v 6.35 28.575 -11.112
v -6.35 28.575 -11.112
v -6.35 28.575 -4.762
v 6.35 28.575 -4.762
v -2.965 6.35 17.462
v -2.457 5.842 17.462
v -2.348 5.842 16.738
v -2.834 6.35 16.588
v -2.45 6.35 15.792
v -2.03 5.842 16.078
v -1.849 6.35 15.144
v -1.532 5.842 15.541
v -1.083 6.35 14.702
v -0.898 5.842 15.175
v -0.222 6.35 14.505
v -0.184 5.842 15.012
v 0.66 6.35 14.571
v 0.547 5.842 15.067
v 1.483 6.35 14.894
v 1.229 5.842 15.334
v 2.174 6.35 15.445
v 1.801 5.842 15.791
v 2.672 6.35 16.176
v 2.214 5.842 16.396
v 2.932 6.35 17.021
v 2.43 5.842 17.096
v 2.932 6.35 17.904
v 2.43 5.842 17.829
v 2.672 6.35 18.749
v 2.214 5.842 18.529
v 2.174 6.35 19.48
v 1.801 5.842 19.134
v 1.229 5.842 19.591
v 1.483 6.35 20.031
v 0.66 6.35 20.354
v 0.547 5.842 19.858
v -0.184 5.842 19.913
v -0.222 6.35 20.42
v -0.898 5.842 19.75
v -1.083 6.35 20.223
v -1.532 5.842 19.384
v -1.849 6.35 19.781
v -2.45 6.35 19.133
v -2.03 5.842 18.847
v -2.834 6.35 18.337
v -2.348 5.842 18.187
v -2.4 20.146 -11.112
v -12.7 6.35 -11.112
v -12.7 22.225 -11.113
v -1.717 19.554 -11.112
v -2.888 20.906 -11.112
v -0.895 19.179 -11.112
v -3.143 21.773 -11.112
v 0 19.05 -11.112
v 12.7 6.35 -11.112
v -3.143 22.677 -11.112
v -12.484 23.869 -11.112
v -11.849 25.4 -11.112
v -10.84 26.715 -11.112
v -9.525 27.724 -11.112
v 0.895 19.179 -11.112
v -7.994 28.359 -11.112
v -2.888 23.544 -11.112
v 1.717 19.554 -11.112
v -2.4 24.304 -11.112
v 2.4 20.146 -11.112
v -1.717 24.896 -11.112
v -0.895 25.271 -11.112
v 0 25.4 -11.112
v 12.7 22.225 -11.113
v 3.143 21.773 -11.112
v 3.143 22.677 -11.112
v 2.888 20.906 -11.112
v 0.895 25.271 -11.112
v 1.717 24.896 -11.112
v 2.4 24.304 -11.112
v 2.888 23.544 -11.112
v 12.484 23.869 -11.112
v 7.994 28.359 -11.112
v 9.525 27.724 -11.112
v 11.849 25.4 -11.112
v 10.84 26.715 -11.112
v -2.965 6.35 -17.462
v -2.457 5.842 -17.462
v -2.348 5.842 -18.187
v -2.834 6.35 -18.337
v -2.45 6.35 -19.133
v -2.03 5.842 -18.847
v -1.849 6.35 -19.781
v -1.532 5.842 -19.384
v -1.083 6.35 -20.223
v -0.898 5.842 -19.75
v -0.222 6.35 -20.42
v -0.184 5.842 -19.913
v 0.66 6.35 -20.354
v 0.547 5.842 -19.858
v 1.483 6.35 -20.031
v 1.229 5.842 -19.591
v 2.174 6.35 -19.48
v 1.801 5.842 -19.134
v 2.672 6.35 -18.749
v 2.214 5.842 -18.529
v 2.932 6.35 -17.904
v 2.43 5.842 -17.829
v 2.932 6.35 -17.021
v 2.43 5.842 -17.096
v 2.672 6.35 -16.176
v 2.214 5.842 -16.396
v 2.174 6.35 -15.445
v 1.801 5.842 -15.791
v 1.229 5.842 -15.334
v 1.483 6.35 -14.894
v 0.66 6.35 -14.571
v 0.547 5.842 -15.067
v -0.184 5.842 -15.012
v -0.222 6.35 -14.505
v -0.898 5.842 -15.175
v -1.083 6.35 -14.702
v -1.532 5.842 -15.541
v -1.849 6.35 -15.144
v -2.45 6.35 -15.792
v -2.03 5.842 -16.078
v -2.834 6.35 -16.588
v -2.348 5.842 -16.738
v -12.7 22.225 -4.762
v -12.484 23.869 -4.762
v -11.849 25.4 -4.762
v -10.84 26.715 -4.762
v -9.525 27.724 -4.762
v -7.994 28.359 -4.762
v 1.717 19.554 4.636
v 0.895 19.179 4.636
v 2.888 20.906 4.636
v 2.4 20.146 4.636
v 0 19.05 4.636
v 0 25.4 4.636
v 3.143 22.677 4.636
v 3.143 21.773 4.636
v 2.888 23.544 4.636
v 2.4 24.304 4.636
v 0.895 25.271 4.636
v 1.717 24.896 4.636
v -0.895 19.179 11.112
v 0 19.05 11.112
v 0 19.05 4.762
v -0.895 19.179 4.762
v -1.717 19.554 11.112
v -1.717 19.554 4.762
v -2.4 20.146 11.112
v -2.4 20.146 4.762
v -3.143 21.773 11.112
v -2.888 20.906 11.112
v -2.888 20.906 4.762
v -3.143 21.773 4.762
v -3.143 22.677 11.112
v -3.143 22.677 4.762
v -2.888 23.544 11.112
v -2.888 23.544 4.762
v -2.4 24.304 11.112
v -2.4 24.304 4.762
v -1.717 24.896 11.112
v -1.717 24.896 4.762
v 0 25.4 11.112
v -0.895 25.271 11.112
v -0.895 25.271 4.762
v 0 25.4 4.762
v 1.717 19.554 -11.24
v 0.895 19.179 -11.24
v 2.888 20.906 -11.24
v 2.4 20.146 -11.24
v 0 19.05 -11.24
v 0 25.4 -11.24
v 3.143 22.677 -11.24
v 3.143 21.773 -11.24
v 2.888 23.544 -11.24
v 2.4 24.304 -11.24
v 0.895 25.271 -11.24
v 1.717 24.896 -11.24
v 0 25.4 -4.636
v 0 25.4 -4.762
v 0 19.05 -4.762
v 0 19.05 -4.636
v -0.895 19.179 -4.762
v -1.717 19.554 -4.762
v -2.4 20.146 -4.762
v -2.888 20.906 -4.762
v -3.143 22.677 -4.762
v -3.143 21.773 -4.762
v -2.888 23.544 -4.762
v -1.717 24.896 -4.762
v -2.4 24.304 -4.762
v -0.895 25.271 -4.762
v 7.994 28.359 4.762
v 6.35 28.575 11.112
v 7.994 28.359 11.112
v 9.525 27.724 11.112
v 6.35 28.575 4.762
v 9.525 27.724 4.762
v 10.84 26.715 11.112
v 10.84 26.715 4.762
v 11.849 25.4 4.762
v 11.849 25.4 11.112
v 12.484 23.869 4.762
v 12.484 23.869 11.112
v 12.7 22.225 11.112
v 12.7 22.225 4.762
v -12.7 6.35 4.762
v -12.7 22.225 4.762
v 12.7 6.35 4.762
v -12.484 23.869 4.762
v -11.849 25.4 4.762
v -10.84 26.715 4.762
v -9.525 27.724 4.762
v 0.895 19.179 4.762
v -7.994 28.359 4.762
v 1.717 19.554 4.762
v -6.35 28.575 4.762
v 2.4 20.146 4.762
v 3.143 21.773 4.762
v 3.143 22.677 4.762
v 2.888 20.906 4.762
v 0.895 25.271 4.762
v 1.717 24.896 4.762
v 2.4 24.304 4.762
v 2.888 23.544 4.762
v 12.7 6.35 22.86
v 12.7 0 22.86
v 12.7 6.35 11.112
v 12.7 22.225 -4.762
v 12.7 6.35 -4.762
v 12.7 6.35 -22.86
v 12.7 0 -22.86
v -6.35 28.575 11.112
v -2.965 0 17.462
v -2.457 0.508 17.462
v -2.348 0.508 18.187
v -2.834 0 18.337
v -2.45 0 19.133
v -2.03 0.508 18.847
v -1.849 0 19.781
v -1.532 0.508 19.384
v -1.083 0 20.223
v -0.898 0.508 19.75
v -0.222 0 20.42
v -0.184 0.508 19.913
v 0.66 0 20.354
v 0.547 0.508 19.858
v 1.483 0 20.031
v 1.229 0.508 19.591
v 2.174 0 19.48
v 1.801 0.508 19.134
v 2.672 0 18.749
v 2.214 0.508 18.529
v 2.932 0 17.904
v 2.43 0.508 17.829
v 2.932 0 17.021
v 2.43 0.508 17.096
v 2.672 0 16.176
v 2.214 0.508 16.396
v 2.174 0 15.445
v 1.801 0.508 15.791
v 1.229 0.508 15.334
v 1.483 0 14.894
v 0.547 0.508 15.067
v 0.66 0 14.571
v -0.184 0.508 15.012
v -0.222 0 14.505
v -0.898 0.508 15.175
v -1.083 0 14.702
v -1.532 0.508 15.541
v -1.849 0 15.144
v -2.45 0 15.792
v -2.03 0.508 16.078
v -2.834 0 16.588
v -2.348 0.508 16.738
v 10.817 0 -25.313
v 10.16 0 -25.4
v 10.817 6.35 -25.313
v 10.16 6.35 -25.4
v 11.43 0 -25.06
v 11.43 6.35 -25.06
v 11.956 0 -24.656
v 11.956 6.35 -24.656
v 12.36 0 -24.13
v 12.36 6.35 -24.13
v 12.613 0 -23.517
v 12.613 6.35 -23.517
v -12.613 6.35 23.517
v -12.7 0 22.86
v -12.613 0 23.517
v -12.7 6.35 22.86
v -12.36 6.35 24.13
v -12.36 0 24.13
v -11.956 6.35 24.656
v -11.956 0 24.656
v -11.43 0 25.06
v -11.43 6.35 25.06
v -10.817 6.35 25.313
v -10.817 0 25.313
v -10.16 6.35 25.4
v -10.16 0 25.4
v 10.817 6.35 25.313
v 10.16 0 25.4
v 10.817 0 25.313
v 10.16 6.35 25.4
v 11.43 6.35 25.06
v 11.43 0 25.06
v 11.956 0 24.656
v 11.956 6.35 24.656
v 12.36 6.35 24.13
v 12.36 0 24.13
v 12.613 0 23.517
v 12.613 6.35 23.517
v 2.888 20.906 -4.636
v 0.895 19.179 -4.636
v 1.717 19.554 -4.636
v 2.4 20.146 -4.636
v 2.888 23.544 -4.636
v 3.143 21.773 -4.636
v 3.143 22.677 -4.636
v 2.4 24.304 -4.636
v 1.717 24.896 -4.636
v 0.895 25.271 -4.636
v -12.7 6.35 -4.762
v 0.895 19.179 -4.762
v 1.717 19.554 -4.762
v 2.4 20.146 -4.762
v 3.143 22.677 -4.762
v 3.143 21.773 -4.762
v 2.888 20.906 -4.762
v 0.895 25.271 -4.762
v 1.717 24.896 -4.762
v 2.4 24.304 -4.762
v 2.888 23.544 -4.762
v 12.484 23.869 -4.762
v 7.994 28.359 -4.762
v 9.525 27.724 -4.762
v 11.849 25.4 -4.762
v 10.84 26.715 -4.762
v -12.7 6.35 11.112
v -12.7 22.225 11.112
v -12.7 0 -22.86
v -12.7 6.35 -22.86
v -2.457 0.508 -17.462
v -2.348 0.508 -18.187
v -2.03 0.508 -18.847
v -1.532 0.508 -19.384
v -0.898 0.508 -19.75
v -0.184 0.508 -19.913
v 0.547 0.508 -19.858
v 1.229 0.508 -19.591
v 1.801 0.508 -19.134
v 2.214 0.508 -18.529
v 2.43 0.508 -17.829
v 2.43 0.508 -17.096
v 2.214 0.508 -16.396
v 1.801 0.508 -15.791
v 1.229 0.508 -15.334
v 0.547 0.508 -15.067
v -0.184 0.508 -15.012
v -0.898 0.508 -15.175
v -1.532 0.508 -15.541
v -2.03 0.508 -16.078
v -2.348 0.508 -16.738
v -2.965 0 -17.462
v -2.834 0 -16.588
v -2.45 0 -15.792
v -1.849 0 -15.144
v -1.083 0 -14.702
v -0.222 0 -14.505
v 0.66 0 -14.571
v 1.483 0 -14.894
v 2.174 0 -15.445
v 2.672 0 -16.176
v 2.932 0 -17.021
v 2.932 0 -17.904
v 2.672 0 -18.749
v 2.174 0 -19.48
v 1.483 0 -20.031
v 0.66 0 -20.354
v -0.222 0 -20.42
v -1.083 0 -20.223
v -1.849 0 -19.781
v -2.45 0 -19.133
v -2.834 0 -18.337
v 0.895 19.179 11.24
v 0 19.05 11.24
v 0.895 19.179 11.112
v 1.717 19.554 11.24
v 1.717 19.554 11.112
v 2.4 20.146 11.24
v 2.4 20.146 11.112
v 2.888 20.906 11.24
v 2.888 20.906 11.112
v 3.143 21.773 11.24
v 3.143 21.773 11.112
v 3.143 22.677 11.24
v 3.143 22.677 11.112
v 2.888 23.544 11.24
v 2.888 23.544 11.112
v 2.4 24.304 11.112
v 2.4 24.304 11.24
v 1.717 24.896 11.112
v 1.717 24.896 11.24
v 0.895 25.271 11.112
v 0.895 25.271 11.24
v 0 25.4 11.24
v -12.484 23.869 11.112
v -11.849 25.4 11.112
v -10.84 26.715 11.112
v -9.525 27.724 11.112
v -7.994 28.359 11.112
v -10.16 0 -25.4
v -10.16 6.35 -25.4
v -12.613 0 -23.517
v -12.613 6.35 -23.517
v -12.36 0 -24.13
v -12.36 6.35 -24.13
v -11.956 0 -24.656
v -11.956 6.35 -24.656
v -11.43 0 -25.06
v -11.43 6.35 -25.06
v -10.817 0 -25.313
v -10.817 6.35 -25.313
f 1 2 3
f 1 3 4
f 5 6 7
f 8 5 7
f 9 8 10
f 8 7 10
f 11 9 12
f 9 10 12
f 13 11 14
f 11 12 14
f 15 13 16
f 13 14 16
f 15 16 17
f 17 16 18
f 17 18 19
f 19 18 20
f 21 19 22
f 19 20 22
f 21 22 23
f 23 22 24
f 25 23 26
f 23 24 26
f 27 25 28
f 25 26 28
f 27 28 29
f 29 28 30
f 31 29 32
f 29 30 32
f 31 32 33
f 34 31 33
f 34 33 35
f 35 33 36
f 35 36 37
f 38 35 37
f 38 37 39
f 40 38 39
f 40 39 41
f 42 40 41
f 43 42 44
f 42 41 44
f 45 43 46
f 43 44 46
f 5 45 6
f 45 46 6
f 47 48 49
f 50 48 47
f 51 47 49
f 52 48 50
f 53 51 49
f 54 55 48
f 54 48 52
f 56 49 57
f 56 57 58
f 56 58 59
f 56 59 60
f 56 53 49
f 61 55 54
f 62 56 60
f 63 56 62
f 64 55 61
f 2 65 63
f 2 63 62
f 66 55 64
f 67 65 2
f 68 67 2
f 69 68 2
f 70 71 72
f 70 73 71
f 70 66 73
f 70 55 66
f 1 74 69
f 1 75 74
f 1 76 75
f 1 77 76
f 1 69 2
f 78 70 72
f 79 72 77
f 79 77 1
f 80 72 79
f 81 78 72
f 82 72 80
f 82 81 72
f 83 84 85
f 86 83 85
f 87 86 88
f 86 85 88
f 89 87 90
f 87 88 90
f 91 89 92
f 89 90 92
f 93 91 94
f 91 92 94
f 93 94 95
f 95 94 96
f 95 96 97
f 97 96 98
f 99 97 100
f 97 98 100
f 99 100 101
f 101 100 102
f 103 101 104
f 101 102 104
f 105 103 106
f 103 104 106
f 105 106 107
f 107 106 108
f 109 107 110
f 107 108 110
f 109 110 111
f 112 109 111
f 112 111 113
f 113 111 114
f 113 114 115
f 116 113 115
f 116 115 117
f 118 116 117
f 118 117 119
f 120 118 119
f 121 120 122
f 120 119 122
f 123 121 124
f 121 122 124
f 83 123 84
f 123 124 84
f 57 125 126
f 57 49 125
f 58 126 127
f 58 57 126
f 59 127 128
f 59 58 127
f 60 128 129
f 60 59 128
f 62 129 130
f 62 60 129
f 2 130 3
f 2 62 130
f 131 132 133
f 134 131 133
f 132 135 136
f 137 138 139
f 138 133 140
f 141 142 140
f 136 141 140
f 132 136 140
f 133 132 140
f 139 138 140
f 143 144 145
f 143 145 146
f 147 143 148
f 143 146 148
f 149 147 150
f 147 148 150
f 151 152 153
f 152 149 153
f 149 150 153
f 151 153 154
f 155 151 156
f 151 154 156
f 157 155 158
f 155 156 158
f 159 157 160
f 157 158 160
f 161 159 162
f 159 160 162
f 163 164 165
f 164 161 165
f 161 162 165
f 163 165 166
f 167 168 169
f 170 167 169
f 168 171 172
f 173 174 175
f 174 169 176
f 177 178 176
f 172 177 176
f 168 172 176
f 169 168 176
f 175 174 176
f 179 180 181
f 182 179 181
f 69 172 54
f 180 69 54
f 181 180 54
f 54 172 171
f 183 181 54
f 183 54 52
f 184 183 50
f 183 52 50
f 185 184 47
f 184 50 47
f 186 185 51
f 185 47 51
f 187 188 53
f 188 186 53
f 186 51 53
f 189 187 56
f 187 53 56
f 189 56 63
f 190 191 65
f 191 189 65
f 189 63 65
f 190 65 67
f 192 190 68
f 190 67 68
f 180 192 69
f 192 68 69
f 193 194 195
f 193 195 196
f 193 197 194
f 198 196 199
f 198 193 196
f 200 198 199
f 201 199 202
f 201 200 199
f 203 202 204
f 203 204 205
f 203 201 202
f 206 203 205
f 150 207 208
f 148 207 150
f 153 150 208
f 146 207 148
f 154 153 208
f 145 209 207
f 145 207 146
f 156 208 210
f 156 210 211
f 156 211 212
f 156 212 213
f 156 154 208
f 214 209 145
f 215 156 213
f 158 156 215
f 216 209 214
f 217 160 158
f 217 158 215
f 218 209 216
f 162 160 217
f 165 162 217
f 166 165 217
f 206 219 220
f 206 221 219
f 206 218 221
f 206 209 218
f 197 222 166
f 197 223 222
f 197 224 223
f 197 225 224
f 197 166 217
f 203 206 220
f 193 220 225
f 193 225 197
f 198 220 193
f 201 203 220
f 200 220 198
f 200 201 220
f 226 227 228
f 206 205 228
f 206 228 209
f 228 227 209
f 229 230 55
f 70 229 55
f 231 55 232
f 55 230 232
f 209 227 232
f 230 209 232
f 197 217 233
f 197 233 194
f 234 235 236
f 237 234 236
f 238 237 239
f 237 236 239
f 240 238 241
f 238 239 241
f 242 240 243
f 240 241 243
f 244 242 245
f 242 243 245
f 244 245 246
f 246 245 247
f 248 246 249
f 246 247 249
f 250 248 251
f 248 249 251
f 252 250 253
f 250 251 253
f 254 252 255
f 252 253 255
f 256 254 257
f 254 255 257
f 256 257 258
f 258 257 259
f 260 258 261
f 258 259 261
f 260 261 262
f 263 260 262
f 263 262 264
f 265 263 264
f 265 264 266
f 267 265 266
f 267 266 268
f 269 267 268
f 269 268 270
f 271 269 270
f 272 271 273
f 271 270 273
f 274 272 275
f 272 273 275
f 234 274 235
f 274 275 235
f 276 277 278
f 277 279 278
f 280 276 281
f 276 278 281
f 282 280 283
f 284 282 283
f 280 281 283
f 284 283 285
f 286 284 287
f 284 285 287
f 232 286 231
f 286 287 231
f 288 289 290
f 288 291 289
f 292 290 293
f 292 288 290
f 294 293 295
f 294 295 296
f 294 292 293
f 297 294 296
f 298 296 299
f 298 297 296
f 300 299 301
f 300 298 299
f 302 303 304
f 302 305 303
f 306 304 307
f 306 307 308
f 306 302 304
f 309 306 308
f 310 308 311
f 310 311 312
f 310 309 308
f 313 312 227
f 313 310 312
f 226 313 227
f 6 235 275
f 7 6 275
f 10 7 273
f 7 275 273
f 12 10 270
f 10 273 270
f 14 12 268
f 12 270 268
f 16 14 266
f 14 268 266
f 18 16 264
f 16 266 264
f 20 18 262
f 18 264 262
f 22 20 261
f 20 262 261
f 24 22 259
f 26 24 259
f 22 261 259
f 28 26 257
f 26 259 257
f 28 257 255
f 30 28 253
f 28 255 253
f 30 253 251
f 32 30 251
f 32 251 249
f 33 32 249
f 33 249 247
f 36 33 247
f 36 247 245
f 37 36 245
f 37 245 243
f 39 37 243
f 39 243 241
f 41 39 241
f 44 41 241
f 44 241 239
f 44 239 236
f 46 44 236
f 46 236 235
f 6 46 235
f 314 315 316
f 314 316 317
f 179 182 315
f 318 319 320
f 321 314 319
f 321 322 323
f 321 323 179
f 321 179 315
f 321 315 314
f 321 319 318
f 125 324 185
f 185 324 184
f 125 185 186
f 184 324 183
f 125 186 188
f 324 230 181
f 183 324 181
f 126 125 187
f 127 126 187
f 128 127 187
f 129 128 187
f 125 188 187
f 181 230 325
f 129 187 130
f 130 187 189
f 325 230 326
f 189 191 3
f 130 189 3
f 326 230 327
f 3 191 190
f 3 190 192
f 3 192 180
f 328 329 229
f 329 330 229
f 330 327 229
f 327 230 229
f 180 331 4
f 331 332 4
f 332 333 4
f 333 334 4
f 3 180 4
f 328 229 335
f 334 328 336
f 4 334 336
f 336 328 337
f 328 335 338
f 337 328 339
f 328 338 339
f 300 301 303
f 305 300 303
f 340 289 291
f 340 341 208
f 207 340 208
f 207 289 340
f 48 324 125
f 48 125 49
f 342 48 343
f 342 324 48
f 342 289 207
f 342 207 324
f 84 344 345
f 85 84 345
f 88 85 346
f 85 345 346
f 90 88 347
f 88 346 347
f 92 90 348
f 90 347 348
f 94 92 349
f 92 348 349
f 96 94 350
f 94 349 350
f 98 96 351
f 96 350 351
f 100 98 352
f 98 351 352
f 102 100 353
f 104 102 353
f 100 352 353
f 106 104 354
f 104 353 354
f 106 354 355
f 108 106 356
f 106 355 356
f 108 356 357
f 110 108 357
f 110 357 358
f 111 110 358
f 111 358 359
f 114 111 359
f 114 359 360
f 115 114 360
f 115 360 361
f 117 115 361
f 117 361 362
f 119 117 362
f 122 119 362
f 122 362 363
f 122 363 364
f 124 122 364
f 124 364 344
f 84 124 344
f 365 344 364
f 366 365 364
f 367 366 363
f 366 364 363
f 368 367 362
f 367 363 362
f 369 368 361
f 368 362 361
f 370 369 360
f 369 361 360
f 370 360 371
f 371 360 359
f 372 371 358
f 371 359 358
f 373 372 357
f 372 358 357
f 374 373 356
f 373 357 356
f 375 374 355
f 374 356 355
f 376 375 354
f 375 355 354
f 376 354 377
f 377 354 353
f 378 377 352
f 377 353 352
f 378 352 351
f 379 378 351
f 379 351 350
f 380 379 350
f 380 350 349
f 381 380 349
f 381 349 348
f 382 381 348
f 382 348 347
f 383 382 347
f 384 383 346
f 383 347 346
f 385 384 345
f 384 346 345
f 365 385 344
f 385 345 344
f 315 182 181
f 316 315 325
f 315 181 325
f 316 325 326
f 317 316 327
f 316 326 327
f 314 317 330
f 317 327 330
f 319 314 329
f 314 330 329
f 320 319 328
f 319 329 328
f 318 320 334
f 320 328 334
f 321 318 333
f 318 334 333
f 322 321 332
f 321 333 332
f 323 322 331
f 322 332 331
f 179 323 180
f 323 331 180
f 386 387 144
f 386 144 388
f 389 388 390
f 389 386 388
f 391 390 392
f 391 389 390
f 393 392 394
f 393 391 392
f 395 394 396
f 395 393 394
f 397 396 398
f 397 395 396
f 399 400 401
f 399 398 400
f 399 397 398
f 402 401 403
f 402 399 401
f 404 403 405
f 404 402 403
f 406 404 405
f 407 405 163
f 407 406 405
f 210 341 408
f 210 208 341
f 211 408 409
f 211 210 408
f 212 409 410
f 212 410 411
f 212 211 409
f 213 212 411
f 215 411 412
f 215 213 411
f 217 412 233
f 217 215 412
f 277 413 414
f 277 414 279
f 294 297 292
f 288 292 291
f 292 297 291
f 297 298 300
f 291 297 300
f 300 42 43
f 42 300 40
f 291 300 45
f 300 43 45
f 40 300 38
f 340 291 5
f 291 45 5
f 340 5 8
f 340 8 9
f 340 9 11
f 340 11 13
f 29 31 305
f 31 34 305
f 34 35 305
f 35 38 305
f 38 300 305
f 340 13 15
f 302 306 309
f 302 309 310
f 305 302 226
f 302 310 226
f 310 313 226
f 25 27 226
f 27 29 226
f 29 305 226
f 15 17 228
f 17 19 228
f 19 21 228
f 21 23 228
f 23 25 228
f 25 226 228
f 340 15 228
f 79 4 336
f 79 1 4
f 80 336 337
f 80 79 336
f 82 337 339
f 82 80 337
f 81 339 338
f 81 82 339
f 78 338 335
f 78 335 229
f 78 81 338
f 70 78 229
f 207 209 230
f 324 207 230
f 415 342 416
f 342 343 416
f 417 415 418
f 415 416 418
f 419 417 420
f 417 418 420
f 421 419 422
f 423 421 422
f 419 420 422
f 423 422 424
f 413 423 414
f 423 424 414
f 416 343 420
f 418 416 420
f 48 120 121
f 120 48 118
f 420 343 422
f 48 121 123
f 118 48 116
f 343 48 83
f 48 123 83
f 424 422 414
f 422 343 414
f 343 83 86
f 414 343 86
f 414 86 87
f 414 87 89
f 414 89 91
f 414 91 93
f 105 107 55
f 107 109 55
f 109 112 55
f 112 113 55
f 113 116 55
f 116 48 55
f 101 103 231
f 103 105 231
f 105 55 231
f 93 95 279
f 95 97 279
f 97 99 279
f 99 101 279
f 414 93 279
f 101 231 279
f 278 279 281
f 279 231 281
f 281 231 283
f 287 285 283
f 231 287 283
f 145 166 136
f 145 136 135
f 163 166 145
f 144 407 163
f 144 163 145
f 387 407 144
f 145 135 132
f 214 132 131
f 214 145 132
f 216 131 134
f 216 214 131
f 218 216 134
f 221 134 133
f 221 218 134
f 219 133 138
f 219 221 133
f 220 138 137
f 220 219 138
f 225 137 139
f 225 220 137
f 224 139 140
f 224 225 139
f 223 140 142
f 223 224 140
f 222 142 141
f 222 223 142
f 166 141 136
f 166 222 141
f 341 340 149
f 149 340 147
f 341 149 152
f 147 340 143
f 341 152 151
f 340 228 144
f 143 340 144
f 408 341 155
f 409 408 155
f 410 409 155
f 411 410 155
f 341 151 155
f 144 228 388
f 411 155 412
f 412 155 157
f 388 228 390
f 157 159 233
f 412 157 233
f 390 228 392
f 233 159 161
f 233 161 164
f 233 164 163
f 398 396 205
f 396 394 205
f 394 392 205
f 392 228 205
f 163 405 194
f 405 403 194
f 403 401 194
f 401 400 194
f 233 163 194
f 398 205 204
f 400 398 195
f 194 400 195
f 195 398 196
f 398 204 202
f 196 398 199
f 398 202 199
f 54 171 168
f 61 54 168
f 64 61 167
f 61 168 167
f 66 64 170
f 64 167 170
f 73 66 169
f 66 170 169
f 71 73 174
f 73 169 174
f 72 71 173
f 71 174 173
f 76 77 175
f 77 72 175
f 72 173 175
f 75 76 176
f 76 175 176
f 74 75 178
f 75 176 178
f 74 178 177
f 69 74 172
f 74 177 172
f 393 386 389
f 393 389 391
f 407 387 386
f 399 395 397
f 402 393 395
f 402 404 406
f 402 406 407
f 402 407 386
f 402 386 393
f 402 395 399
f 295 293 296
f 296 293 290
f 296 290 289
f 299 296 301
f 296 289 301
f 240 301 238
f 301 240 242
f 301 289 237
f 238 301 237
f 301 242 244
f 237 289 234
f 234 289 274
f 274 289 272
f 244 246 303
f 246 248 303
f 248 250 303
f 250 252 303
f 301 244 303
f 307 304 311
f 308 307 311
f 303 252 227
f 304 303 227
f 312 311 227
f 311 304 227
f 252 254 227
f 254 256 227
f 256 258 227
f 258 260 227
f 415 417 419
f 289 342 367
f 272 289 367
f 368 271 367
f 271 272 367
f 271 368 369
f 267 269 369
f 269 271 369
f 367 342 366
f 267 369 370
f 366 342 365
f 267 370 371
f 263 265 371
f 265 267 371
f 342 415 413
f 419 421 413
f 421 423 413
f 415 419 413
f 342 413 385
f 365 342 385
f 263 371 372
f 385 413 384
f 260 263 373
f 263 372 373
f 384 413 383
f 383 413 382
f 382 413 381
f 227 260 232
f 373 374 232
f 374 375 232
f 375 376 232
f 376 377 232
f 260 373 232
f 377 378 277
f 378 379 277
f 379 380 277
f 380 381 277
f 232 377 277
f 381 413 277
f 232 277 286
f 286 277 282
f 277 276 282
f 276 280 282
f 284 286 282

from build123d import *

# Parameters (mm, degrees)
SKETCH2_W                        = 25.4
SKETCH2_H                        = 50.8
BOSS_EXTRUDE2_DEPTH              = 28.575
SKETCH3_W                        = 14.2875
SKETCH3_H                        = 22.225
SKETCH3_W_2                      = 9.525
CUT_EXTRUDE1_DEPTH               = 26.4
F_10_0_1935_DIAMETER_HOLE1_D     = 4.9149
F_10_0_1935_DIAMETER_HOLE1_DEPTH = 6.35
F_10_0_1935_DIAMETER_HOLE1_TIP   = 1.476584928
SKETCH8_R                        = 3.175
CUT_EXTRUDE3_DEPTH               = 37.5125
FILLET1_R                        = 6.35
FILLET2_R                        = 2.54
CHAMFER1_SIZE                    = 0.508
BOSS_EXTRUDE3_DEPTH              = 3.302


with BuildPart() as part:
    # Sketch2 → Boss-Extrude2 (new body)
    with BuildSketch(Plane(origin=(0, 0, 0), x_dir=(1, 0, 0), z_dir=(0, 1, 0))):
        Rectangle(SKETCH2_W, SKETCH2_H)
    extrude(amount=BOSS_EXTRUDE2_DEPTH)

    # Sketch3 → Cut-Extrude1 (cut, through all)
    with BuildSketch(Plane(origin=(12.7, 0, 0), x_dir=(0, 0, -1), z_dir=(1, 0, 0))):
        with Locations((-18.25625, 17.4625)):
            Rectangle(SKETCH3_W, SKETCH3_H)
        with Locations((18.25625, 17.4625)):
            Rectangle(SKETCH3_W, SKETCH3_H)
        with Locations((0, 17.4625)):
            Rectangle(SKETCH3_W_2, SKETCH3_H)
    extrude(amount=-CUT_EXTRUDE1_DEPTH, mode=Mode.SUBTRACT)

    # #10 (0.1935) Diameter Hole1
    with Locations(Plane(origin=(0, 6.35, 0), x_dir=(1, 0, 0), z_dir=(0, 1, 0))):
        with Locations((0, -17.4625), (0, 17.4625)):
            Hole(F_10_0_1935_DIAMETER_HOLE1_D / 2, depth=F_10_0_1935_DIAMETER_HOLE1_DEPTH)
            with Locations((0, 0, -(F_10_0_1935_DIAMETER_HOLE1_DEPTH + F_10_0_1935_DIAMETER_HOLE1_TIP / 2))):  # 118° drill point
                Cone(0, F_10_0_1935_DIAMETER_HOLE1_D / 2, F_10_0_1935_DIAMETER_HOLE1_TIP, mode=Mode.SUBTRACT)

    # Sketch8 → Cut-Extrude3 (cut, through all)
    with BuildSketch(Plane(origin=(0, 0, -11.1125), x_dir=(-1, 0, 0), z_dir=(0, 0, -1))):
        with Locations((0, 22.225)):
            Circle(SKETCH8_R)
    extrude(amount=-CUT_EXTRUDE3_DEPTH, mode=Mode.SUBTRACT)

    # Fillet1
    fillet1_edges = [part.edges().sort_by_distance(p)[0] for p in [
        (12.7, 28.575, 7.9375),
        (-12.7, 28.575, -7.9375),
        (-12.7, 28.575, 7.9375),
        (12.7, 28.575, -7.9375),
    ]]
    fillet(fillet1_edges, radius=FILLET1_R)

    # Fillet2
    fillet2_edges = [part.edges().sort_by_distance(p)[0] for p in [
        (12.7, 3.175, 25.4),
        (-12.7, 3.175, 25.4),
        (-12.7, 3.175, -25.4),
        (12.7, 3.175, -25.4),
    ]]
    fillet(fillet2_edges, radius=FILLET2_R)

    # Chamfer1
    chamfer1_edges = [part.edges().sort_by_distance(p)[0] for p in [
        (2.45745, 6.35, -17.4625),
        (2.45745, 0, -17.4625),
        (2.45745, 6.35, 17.4625),
        (2.45745, 0, 17.4625),
    ]]
    chamfer(chamfer1_edges, length=CHAMFER1_SIZE)

    # Sketch10 → Boss-Extrude3 (add, symmetric)
    with BuildSketch(Plane(origin=(0, 0, -7.9375), x_dir=(-1, 0, 0), z_dir=(0, 0, -1))):
        with BuildLine():
            Line((0, 25.4), (0, 19.05))
            ThreePointArc((0, 19.05), (-3.175, 22.225), (0, 25.4))
        make_face()
    boss_extrude3 = extrude(amount=BOSS_EXTRUDE3_DEPTH, both=True)

    # Mirror1: Boss-Extrude3 across plane
    add(boss_extrude3.mirror(Plane.XY))


solid = part.part
